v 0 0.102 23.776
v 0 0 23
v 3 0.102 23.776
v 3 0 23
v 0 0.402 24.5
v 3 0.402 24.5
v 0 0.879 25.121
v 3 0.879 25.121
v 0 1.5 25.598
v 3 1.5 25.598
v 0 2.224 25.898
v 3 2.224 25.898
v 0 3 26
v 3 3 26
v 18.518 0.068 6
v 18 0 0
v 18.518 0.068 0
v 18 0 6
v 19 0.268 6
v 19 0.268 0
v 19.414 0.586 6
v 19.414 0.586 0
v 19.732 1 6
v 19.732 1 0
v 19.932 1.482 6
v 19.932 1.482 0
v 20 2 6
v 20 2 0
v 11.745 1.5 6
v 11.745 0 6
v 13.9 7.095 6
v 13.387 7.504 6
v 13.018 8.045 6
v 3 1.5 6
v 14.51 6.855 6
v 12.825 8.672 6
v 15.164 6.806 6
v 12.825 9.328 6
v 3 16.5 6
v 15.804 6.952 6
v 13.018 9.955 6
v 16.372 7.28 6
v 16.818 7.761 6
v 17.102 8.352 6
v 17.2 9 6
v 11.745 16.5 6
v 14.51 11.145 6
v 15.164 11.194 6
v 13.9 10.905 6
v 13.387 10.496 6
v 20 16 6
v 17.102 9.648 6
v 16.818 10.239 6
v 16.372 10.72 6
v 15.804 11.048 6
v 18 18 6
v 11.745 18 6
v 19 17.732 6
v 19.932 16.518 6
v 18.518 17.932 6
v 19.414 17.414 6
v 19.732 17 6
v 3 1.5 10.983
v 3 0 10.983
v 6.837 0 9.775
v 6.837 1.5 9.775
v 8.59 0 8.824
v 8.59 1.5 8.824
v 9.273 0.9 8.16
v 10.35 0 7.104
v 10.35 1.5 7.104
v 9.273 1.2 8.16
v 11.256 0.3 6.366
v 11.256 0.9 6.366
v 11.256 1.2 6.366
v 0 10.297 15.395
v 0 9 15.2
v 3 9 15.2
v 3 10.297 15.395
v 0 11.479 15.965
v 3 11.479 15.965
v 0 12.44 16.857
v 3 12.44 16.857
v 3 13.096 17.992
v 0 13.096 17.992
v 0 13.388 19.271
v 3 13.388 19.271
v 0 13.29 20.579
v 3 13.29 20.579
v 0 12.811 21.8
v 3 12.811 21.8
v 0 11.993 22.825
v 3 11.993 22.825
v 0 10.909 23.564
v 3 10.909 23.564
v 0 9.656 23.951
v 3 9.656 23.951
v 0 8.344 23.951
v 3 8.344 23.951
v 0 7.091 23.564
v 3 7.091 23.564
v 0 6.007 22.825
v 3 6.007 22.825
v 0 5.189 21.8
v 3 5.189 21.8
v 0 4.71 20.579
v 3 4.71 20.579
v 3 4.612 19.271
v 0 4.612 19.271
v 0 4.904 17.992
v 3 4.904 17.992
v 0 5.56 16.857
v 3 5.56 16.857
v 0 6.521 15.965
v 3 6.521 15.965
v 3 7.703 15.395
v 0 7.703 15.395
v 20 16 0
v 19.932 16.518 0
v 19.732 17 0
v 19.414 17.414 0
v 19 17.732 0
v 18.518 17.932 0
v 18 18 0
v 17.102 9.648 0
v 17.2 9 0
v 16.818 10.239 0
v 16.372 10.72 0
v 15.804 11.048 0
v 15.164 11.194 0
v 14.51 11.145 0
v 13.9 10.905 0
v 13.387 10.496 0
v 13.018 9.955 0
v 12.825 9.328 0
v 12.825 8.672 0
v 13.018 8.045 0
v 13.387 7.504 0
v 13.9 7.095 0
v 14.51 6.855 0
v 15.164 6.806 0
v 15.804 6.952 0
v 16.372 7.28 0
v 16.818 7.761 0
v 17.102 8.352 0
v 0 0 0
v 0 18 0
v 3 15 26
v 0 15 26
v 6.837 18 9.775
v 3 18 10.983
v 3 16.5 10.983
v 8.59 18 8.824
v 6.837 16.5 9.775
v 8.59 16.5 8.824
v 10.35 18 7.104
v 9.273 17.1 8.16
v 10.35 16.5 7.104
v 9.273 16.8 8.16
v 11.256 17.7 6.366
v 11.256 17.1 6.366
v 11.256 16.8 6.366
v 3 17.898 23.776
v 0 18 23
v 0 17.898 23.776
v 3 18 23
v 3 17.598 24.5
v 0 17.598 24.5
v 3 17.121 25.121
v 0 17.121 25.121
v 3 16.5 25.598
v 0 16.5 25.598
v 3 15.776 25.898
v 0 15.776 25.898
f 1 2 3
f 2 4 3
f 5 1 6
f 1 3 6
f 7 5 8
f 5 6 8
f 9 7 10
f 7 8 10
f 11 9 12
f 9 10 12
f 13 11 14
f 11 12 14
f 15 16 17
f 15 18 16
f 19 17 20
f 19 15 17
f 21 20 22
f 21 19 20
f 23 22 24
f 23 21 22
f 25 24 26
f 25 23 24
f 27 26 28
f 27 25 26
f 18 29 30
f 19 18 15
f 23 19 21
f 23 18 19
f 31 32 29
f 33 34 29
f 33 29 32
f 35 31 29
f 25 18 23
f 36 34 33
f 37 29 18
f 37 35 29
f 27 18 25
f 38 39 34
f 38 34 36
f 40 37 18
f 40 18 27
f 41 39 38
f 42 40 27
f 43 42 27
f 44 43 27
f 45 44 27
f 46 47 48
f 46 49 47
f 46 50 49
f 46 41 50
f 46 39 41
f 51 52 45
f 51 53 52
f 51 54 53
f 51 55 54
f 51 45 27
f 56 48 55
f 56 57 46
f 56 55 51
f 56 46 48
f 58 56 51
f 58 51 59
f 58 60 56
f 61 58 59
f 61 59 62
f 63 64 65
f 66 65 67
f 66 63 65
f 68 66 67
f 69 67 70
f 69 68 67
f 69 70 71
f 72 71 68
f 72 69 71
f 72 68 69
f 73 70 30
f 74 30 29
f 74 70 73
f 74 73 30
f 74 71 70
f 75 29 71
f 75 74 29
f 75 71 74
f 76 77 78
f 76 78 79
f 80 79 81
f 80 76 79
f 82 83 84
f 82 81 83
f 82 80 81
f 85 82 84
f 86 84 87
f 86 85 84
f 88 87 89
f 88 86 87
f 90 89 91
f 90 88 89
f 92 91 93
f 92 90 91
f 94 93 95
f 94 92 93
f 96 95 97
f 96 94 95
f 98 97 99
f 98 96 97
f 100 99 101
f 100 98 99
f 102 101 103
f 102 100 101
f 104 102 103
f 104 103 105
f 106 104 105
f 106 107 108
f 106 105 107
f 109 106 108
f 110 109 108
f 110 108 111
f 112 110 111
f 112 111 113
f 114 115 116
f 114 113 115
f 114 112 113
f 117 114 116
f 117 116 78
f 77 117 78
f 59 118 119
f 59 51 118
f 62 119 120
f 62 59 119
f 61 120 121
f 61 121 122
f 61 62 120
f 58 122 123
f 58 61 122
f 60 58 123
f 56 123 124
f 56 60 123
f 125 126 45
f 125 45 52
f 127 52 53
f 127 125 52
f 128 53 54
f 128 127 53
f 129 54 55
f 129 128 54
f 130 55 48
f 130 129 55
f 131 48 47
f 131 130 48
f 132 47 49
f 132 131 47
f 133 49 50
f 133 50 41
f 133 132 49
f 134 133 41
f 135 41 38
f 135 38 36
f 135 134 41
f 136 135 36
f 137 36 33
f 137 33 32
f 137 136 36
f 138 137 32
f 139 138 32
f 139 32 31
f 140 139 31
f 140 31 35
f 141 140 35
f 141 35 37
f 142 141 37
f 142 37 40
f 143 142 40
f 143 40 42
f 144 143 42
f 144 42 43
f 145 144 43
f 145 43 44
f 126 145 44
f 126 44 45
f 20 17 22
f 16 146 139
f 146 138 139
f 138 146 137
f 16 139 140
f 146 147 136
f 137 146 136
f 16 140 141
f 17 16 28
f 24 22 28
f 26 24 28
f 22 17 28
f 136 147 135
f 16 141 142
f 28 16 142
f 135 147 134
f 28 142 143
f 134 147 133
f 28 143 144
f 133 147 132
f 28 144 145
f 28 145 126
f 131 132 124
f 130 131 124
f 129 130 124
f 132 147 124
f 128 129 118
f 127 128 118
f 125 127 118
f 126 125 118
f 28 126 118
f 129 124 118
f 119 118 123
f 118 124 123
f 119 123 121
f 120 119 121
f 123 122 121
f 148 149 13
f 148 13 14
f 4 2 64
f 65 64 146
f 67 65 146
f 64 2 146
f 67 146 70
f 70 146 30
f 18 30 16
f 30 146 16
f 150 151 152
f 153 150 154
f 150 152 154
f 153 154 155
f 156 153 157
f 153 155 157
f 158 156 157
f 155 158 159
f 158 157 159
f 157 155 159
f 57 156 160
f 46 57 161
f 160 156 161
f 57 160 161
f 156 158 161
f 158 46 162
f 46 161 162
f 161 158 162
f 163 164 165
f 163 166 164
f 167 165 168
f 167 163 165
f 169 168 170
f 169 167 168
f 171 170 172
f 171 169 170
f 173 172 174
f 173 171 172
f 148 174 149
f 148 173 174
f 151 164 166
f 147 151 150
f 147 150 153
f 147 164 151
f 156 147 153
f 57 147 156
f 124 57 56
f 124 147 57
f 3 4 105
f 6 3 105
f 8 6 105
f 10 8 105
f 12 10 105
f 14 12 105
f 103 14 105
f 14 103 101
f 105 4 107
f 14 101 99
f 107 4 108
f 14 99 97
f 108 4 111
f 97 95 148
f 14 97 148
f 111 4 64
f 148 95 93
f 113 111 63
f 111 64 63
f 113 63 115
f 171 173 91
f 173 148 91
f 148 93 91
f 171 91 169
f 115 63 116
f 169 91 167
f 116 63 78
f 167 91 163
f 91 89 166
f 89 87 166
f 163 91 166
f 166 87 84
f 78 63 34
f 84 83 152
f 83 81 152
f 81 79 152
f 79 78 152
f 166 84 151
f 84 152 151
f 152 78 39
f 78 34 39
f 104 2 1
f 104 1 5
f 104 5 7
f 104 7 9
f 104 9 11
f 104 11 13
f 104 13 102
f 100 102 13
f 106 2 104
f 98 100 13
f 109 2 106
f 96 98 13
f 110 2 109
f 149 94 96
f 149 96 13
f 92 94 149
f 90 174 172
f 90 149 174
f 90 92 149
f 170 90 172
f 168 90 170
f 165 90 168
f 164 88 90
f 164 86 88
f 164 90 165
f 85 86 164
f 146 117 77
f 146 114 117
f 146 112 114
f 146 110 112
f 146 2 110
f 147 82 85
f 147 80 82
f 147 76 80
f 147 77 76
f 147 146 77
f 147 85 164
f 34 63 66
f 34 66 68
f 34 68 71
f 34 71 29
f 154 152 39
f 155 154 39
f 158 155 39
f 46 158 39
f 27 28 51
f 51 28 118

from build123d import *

# Parameters (mm, degrees)
PAD_DEPTH         = 1.5
CYLINDER001_R     = 2.2
CYLINDER001_DEPTH = 10
CYLINDER_R        = 4.4
CYLINDER_DEPTH    = 10
BOX001_W          = 3
BOX001_H          = 18
BOX001_DEPTH      = 20
FILLET001_R       = 3
BOX_W             = 20
BOX_H             = 18
BOX_DEPTH         = 6
FILLET_R          = 2


with BuildPart() as side_wall_body:
    # Sketch → Pad (new body)
    with BuildSketch(Plane.XZ):
        with BuildLine():
            Line((0, 11.694638), (0, 0))
            Line((0, 0), (14.6909, 0))
            add(Edge.make_bspline(
                [(0, 11.694638), (7.772997, 9.987508), (9.324936, 7.918261), (11.342452, 6.262862), (12.842653, 5.228237), (14.084202, 4.193611), (15.118829, 2.176094), (14.6909, 0)],
                knots=[0, 0, 0, 0, 0.2, 0.4, 0.6, 0.8, 1, 1, 1, 1], degree=3))
        make_face()
    extrude(amount=PAD_DEPTH)


with BuildPart() as side_wall_fusion:
    # Part__Mirroring: instance of side wall body
    add(side_wall_body.part.mirror(Plane(origin=(0, 7.5, 0), x_dir=(1, 0, 0), z_dir=(0, 1, 0))))

    # Fusion002: union side wall body
    add(side_wall_body.part)


with BuildPart() as side_wall_fusion_1:
    # Fusion002 placement: moved
    add(side_wall_fusion.part.moved(Location((0, 1.5, 0))))


with BuildPart() as bolt_hole:
    # Cylinder001 → Cylinder001 (new body)
    with BuildSketch(Plane(origin=(15, 9, -4), x_dir=(1, 0, 0), z_dir=(0, 0, 1))):
        Circle(CYLINDER001_R)
    extrude(amount=CYLINDER001_DEPTH)


with BuildPart() as hole_fusion:
    # Cylinder → Cylinder (new body)
    with BuildSketch(Plane(origin=(-3, 9, 19.6), x_dir=(0, 0, -1), z_dir=(1, 0, 0))):
        Circle(CYLINDER_R)
    extrude(amount=CYLINDER_DEPTH)

    # Fusion001: union bolt hole
    add(bolt_hole.part)


with BuildPart() as socket_fillet:
    # Box001 → Box001 (new body)
    with BuildSketch(Plane.XY.offset(6)):
        with Locations((1.5, 9)):
            Rectangle(BOX001_W, BOX001_H)
    extrude(amount=BOX001_DEPTH)

    # Fillet001
    fillet001_edges = [socket_fillet.edges().sort_by_distance(p)[0] for p in [
        (1.5, 0, 26),
        (1.5, 18, 26),
    ]]
    fillet(fillet001_edges, radius=FILLET001_R)


with BuildPart() as power_12v_socket_fusion:
    # Box → Box (new body)
    with BuildSketch(Plane.XY):
        with Locations((10, 9)):
            Rectangle(BOX_W, BOX_H)
    extrude(amount=BOX_DEPTH)

    # Fillet
    fillet_edges = [power_12v_socket_fusion.edges().sort_by_distance(p)[0] for p in [
        (20, 0, 3),
        (20, 18, 3),
    ]]
    fillet(fillet_edges, radius=FILLET_R)

    # Fusion: union socket fillet
    add(socket_fillet.part)

    # Cut: cut hole fusion
    add(hole_fusion.part, mode=Mode.SUBTRACT)

    # Fusion003: union side wall fusion
    add(side_wall_fusion_1.part)


solid = power_12v_socket_fusion.part
